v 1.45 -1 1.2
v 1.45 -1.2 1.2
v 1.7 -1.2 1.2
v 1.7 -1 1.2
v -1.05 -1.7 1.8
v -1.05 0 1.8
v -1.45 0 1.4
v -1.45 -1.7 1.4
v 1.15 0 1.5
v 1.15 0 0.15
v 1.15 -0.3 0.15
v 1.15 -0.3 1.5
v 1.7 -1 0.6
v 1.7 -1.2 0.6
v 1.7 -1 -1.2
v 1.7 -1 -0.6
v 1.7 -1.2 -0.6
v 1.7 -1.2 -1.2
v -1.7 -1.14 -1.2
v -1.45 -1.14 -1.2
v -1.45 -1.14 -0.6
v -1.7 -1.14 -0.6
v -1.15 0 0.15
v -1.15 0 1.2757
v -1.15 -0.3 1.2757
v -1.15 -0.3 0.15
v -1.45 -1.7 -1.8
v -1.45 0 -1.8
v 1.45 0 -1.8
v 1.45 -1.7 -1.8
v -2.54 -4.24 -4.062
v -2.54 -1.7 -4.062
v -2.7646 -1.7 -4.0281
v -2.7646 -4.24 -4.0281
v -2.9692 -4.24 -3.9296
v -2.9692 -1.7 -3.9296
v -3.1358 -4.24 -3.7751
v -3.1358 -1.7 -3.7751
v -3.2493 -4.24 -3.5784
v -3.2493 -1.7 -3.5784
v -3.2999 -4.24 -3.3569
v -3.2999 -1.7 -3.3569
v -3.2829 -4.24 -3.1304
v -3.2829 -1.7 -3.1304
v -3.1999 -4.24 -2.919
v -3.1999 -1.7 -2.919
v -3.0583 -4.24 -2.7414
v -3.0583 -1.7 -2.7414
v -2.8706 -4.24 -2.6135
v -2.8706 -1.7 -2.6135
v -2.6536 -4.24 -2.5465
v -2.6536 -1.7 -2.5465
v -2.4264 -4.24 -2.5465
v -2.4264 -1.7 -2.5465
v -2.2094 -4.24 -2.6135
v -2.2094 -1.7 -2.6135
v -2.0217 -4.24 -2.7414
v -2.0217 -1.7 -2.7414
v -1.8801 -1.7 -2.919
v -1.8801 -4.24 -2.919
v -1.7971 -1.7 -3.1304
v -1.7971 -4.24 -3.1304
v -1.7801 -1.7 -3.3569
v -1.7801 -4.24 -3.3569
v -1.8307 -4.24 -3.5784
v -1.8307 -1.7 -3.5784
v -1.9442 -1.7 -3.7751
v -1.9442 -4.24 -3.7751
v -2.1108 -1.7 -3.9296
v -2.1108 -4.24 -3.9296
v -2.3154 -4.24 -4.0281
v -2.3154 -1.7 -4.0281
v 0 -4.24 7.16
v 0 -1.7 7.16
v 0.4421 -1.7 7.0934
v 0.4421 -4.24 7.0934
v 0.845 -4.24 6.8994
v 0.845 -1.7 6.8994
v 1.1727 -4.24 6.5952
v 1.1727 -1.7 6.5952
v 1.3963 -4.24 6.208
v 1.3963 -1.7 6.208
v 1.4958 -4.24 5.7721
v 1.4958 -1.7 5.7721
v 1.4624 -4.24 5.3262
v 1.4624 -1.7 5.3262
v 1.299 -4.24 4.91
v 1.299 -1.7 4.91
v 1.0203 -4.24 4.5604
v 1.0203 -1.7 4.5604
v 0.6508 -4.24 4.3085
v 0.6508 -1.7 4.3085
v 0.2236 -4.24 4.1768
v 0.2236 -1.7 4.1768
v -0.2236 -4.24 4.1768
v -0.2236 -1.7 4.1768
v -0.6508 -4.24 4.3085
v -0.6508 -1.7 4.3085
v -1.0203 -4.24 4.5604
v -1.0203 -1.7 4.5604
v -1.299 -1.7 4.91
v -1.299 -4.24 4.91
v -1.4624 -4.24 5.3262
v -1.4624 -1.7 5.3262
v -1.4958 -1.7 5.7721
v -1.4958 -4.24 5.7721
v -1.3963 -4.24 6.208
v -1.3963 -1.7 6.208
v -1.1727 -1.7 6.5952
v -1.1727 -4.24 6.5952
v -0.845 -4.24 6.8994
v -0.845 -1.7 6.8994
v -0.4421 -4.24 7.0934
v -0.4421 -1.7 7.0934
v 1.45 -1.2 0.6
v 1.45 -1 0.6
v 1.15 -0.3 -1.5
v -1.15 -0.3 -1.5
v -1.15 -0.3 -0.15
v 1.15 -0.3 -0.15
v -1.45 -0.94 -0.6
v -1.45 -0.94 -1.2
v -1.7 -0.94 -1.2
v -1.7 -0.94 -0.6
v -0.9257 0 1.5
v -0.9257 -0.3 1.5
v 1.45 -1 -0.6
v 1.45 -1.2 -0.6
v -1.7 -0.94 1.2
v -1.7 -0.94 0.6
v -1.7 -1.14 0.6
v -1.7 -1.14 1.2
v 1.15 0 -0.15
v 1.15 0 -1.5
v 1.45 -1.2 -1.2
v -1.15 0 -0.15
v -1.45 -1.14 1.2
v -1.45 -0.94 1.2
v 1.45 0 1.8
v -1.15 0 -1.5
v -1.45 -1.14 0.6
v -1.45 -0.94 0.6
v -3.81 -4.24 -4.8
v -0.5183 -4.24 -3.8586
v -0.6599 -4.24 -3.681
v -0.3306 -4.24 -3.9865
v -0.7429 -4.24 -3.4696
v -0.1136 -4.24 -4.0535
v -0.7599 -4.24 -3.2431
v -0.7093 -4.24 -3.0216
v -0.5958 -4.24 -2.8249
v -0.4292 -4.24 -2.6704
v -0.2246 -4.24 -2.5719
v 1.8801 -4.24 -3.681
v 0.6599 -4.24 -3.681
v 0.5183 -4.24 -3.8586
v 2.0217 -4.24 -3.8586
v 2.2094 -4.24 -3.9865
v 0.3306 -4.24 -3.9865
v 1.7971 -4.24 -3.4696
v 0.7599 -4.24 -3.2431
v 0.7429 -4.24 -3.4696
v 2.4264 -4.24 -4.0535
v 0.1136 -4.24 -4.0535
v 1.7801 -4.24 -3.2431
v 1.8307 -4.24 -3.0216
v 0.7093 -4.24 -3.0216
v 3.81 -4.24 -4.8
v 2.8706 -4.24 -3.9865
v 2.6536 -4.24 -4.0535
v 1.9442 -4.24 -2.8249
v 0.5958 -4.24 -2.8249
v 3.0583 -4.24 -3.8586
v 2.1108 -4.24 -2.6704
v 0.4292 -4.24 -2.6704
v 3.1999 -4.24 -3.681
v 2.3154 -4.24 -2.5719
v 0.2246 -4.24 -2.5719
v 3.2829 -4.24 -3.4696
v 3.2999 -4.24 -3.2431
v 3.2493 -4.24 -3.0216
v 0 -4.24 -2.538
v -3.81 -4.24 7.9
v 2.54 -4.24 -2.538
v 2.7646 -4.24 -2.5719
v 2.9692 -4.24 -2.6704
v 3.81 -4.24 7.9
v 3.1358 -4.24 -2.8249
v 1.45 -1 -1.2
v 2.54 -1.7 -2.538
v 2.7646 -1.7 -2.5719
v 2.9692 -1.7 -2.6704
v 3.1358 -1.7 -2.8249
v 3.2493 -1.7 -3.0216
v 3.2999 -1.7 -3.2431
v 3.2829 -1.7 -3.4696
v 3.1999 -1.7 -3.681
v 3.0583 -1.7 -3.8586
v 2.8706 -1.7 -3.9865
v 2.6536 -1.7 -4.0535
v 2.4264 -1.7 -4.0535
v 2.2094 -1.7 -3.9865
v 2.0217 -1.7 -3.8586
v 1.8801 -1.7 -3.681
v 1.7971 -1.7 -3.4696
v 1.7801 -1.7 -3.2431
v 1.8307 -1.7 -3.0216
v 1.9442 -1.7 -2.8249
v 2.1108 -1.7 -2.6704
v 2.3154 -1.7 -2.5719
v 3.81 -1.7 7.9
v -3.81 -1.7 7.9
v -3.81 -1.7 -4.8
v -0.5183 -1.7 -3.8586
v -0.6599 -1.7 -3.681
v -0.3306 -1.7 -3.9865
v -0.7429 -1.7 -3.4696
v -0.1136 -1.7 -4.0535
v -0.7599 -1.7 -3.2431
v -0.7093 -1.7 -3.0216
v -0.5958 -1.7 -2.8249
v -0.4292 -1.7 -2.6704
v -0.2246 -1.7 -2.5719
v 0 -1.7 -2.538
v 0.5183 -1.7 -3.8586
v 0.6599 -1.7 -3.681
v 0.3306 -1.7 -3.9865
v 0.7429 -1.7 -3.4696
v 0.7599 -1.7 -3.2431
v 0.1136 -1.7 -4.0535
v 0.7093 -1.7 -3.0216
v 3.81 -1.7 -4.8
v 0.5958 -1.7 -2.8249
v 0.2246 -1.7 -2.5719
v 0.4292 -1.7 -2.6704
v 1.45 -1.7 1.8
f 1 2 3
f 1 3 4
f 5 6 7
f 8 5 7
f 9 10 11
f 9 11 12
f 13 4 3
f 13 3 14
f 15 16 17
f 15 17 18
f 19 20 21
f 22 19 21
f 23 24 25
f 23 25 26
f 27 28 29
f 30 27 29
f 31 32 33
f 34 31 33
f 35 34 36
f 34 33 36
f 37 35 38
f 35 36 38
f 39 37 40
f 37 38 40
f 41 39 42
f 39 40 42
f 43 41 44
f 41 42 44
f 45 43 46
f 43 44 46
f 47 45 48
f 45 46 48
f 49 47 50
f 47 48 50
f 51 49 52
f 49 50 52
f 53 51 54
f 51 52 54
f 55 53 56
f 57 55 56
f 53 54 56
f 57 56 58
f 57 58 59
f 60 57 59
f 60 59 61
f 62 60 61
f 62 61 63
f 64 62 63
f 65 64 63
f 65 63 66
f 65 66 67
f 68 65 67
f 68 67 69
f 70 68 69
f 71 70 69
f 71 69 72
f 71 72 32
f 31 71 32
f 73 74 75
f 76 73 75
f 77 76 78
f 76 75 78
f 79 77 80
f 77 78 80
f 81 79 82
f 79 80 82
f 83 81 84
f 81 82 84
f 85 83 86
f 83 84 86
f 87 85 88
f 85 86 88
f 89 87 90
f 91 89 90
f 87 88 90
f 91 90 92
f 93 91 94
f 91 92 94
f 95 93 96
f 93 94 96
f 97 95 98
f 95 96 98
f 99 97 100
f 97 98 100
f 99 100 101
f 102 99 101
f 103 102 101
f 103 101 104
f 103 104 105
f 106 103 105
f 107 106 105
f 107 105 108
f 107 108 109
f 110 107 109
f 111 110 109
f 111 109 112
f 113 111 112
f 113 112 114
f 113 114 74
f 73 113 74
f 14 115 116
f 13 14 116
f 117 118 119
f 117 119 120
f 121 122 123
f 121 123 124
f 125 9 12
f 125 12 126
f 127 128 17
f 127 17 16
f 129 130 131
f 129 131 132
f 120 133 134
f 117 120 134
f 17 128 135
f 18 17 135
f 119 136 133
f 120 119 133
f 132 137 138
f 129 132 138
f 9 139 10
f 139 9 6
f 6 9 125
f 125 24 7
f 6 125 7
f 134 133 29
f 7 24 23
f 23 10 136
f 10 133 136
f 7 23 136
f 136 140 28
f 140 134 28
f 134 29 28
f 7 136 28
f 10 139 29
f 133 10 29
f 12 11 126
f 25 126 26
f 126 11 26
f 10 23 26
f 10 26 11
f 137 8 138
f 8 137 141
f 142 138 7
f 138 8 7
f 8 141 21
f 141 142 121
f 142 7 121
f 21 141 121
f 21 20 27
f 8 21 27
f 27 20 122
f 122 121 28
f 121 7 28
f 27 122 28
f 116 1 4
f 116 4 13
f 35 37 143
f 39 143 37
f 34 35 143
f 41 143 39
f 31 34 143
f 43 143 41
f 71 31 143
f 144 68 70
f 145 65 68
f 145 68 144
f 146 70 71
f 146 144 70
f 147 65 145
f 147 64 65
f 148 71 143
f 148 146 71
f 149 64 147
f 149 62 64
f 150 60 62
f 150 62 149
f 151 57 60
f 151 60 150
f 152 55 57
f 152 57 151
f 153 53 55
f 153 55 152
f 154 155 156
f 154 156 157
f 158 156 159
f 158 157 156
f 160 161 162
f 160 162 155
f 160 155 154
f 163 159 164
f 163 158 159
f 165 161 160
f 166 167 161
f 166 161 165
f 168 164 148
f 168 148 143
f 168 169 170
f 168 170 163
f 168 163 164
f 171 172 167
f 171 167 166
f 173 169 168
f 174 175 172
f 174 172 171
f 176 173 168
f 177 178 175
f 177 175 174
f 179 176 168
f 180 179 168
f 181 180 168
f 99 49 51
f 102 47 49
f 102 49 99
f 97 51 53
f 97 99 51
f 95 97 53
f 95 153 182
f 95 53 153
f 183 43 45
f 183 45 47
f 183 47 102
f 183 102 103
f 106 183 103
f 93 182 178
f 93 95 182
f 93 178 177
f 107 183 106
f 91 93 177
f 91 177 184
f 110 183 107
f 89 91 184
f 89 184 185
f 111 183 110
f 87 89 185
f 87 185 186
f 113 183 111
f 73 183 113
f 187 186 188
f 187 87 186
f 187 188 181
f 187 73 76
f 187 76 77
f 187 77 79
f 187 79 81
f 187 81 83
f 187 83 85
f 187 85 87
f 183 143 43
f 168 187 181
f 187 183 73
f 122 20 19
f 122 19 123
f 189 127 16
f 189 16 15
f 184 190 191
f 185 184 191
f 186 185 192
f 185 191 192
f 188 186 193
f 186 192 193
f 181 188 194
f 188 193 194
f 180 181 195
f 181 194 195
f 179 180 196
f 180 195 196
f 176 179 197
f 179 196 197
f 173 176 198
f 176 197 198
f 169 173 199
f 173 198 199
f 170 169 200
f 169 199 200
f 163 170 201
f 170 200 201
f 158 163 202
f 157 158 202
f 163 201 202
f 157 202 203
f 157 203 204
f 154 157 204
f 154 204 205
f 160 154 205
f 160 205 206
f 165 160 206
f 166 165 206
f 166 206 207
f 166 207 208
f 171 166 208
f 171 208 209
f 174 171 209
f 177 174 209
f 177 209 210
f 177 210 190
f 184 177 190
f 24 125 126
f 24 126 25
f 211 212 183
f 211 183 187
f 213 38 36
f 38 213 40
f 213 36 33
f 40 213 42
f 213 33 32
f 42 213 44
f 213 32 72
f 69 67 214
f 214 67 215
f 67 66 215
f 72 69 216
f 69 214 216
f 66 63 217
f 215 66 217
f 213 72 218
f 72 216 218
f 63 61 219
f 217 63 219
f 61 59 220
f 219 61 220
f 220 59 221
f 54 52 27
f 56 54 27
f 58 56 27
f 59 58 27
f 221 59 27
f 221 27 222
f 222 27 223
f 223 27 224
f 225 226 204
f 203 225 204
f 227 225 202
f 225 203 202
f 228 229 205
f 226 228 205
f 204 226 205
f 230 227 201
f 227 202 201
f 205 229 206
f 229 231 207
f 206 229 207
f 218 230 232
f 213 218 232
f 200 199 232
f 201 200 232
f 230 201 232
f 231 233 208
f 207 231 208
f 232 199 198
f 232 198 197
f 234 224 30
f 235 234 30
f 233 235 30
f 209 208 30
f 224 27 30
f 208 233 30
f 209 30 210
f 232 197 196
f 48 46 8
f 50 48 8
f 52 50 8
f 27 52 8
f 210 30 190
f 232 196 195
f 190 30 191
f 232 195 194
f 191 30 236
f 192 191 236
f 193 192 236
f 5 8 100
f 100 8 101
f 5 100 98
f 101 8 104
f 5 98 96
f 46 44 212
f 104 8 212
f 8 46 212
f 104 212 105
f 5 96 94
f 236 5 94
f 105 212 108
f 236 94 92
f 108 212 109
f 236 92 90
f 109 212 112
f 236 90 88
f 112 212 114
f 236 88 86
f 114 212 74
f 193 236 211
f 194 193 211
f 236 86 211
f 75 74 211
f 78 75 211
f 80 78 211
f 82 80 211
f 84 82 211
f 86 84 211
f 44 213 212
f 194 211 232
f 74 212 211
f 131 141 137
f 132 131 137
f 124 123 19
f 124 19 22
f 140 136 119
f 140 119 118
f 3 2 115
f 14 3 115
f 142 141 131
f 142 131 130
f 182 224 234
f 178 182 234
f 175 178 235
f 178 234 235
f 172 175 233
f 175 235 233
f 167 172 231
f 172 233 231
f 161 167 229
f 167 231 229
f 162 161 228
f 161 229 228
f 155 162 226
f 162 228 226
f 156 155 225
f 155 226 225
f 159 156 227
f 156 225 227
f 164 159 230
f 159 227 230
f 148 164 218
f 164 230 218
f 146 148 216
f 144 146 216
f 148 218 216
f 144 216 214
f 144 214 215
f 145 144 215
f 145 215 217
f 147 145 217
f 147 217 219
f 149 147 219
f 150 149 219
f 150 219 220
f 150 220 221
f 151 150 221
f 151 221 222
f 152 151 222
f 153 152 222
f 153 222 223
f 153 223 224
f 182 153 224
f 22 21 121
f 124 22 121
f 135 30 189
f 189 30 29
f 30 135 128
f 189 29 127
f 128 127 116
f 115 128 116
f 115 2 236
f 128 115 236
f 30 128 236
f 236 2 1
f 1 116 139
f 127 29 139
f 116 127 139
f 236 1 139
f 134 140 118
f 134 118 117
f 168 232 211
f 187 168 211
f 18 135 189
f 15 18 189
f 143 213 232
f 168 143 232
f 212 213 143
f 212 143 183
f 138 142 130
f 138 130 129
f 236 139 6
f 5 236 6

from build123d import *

# Parameters (mm, degrees)
BOSS_EXTRUDE1_DEPTH = 1.7
SKETCH2_W           = 2.3
SKETCH2_H           = 1.35
CUT_EXTRUDE1_DEPTH  = 0.3
SKETCH3_W           = 0.6
SKETCH3_H           = 0.2
BOSS_EXTRUDE2_DEPTH = 0.25
SKETCH8_W           = 0.6
SKETCH8_H           = 0.2
BOSS_EXTRUDE3_DEPTH = 0.25
SKETCH9_W           = 7.62
SKETCH9_H           = 12.7
BOSS_EXTRUDE4_DEPTH = 2.54
CUT_EXTRUDE2_REACH  = 11.131
SKETCH10_R          = 0.762
SKETCH10_R_2        = 1.5


with BuildPart() as part:
    # Sketch1 → Boss-Extrude1 (new body)
    with BuildSketch(Plane(origin=(0, 0, 0), x_dir=(1, 0, 0), z_dir=(0, 1, 0))):
        Polygon((-1.45, 1.8), (1.45, 1.8), (1.45, -1.8), (-1.05, -1.8), (-1.45, -1.4), align=None)
    extrude(amount=-BOSS_EXTRUDE1_DEPTH)

    # Sketch2 → Cut-Extrude1 (cut)
    with BuildSketch(Plane(origin=(0, 0, 0), x_dir=(1, 0, 0), z_dir=(0, 1, 0))):
        with Locations((0, 0.825)):
            Rectangle(SKETCH2_W, SKETCH2_H)
        Polygon((-1.15, -0.15), (1.15, -0.15), (1.15, -1.5), (-0.925735931, -1.5), (-1.15, -1.275735931), align=None)
    extrude(amount=-CUT_EXTRUDE1_DEPTH, mode=Mode.SUBTRACT)

    # Sketch3 → Boss-Extrude2 (add)
    with BuildSketch(Plane.ZY.offset(1.45)):
        with Locations((-0.9, -1.04)):
            Rectangle(SKETCH3_W, SKETCH3_H)
        with Locations((0.9, -1.04)):
            Rectangle(SKETCH3_W, SKETCH3_H)
    extrude(amount=BOSS_EXTRUDE2_DEPTH)

    # Sketch8 → Boss-Extrude3 (add)
    with BuildSketch(Plane(origin=(1.45, 0, 0), x_dir=(0, 0, -1), z_dir=(1, 0, 0))):
        with Locations((-0.9, -1.1)):
            Rectangle(SKETCH8_W, SKETCH8_H)
        with Locations((0.9, -1.1)):
            Rectangle(SKETCH8_W, SKETCH8_H)
    extrude(amount=BOSS_EXTRUDE3_DEPTH)

    # Sketch9 → Boss-Extrude4 (add)
    with BuildSketch(Plane.XZ.offset(1.7)):
        with Locations((0, 1.55)):
            Rectangle(SKETCH9_W, SKETCH9_H)
    extrude(amount=BOSS_EXTRUDE4_DEPTH)

    # Sketch10 → Cut-Extrude2 (cut, up to next)
    with BuildSketch(Plane(origin=(0, -1.7, 0), x_dir=(1, 0, 0), z_dir=(0, 1, 0)), mode=Mode.PRIVATE) as cut_extrude2_sk1:
        with Locations(Location((0, 3.3, 0), (0, 0, 270))):
            Circle(SKETCH10_R)
    cut_extrude2_tool1 = extrude(cut_extrude2_sk1.sketch, amount=-CUT_EXTRUDE2_REACH, mode=Mode.PRIVATE) & part.part
    # Sketch10 → Cut-Extrude2 (cut, up to next)
    with BuildSketch(Plane(origin=(0, -1.7, 0), x_dir=(1, 0, 0), z_dir=(0, 1, 0)), mode=Mode.PRIVATE) as cut_extrude2_sk2:
        with Locations(Location((2.54, 3.3, 0), (0, 0, 270))):
            Circle(SKETCH10_R)
    cut_extrude2_tool2 = extrude(cut_extrude2_sk2.sketch, amount=-CUT_EXTRUDE2_REACH, mode=Mode.PRIVATE) & part.part
    # Sketch10 → Cut-Extrude2 (cut, up to next)
    with BuildSketch(Plane(origin=(0, -1.7, 0), x_dir=(1, 0, 0), z_dir=(0, 1, 0)), mode=Mode.PRIVATE) as cut_extrude2_sk3:
        with Locations(Location((-2.54, 3.3, 0), (0, 0, 90))):
            Circle(SKETCH10_R)
    cut_extrude2_tool3 = extrude(cut_extrude2_sk3.sketch, amount=-CUT_EXTRUDE2_REACH, mode=Mode.PRIVATE) & part.part
    # Sketch10 → Cut-Extrude2 (cut, up to next)
    with BuildSketch(Plane(origin=(0, -1.7, 0), x_dir=(1, 0, 0), z_dir=(0, 1, 0)), mode=Mode.PRIVATE) as cut_extrude2_sk4:
        with Locations(Location((0, -5.66, 0), (0, 0, 270))):
            Circle(SKETCH10_R_2)
    cut_extrude2_tool4 = extrude(cut_extrude2_sk4.sketch, amount=-CUT_EXTRUDE2_REACH, mode=Mode.PRIVATE) & part.part
    add(cut_extrude2_tool1.solids().sort_by_distance((0, -1.7, -3.3))[0], mode=Mode.SUBTRACT)
    add(cut_extrude2_tool2.solids().sort_by_distance((2.54, -1.7, -3.3))[0], mode=Mode.SUBTRACT)
    add(cut_extrude2_tool3.solids().sort_by_distance((-2.54, -1.7, -3.3))[0], mode=Mode.SUBTRACT)
    add(cut_extrude2_tool4.solids().sort_by_distance((0, -1.7, 5.66))[0], mode=Mode.SUBTRACT)


solid = part.part
